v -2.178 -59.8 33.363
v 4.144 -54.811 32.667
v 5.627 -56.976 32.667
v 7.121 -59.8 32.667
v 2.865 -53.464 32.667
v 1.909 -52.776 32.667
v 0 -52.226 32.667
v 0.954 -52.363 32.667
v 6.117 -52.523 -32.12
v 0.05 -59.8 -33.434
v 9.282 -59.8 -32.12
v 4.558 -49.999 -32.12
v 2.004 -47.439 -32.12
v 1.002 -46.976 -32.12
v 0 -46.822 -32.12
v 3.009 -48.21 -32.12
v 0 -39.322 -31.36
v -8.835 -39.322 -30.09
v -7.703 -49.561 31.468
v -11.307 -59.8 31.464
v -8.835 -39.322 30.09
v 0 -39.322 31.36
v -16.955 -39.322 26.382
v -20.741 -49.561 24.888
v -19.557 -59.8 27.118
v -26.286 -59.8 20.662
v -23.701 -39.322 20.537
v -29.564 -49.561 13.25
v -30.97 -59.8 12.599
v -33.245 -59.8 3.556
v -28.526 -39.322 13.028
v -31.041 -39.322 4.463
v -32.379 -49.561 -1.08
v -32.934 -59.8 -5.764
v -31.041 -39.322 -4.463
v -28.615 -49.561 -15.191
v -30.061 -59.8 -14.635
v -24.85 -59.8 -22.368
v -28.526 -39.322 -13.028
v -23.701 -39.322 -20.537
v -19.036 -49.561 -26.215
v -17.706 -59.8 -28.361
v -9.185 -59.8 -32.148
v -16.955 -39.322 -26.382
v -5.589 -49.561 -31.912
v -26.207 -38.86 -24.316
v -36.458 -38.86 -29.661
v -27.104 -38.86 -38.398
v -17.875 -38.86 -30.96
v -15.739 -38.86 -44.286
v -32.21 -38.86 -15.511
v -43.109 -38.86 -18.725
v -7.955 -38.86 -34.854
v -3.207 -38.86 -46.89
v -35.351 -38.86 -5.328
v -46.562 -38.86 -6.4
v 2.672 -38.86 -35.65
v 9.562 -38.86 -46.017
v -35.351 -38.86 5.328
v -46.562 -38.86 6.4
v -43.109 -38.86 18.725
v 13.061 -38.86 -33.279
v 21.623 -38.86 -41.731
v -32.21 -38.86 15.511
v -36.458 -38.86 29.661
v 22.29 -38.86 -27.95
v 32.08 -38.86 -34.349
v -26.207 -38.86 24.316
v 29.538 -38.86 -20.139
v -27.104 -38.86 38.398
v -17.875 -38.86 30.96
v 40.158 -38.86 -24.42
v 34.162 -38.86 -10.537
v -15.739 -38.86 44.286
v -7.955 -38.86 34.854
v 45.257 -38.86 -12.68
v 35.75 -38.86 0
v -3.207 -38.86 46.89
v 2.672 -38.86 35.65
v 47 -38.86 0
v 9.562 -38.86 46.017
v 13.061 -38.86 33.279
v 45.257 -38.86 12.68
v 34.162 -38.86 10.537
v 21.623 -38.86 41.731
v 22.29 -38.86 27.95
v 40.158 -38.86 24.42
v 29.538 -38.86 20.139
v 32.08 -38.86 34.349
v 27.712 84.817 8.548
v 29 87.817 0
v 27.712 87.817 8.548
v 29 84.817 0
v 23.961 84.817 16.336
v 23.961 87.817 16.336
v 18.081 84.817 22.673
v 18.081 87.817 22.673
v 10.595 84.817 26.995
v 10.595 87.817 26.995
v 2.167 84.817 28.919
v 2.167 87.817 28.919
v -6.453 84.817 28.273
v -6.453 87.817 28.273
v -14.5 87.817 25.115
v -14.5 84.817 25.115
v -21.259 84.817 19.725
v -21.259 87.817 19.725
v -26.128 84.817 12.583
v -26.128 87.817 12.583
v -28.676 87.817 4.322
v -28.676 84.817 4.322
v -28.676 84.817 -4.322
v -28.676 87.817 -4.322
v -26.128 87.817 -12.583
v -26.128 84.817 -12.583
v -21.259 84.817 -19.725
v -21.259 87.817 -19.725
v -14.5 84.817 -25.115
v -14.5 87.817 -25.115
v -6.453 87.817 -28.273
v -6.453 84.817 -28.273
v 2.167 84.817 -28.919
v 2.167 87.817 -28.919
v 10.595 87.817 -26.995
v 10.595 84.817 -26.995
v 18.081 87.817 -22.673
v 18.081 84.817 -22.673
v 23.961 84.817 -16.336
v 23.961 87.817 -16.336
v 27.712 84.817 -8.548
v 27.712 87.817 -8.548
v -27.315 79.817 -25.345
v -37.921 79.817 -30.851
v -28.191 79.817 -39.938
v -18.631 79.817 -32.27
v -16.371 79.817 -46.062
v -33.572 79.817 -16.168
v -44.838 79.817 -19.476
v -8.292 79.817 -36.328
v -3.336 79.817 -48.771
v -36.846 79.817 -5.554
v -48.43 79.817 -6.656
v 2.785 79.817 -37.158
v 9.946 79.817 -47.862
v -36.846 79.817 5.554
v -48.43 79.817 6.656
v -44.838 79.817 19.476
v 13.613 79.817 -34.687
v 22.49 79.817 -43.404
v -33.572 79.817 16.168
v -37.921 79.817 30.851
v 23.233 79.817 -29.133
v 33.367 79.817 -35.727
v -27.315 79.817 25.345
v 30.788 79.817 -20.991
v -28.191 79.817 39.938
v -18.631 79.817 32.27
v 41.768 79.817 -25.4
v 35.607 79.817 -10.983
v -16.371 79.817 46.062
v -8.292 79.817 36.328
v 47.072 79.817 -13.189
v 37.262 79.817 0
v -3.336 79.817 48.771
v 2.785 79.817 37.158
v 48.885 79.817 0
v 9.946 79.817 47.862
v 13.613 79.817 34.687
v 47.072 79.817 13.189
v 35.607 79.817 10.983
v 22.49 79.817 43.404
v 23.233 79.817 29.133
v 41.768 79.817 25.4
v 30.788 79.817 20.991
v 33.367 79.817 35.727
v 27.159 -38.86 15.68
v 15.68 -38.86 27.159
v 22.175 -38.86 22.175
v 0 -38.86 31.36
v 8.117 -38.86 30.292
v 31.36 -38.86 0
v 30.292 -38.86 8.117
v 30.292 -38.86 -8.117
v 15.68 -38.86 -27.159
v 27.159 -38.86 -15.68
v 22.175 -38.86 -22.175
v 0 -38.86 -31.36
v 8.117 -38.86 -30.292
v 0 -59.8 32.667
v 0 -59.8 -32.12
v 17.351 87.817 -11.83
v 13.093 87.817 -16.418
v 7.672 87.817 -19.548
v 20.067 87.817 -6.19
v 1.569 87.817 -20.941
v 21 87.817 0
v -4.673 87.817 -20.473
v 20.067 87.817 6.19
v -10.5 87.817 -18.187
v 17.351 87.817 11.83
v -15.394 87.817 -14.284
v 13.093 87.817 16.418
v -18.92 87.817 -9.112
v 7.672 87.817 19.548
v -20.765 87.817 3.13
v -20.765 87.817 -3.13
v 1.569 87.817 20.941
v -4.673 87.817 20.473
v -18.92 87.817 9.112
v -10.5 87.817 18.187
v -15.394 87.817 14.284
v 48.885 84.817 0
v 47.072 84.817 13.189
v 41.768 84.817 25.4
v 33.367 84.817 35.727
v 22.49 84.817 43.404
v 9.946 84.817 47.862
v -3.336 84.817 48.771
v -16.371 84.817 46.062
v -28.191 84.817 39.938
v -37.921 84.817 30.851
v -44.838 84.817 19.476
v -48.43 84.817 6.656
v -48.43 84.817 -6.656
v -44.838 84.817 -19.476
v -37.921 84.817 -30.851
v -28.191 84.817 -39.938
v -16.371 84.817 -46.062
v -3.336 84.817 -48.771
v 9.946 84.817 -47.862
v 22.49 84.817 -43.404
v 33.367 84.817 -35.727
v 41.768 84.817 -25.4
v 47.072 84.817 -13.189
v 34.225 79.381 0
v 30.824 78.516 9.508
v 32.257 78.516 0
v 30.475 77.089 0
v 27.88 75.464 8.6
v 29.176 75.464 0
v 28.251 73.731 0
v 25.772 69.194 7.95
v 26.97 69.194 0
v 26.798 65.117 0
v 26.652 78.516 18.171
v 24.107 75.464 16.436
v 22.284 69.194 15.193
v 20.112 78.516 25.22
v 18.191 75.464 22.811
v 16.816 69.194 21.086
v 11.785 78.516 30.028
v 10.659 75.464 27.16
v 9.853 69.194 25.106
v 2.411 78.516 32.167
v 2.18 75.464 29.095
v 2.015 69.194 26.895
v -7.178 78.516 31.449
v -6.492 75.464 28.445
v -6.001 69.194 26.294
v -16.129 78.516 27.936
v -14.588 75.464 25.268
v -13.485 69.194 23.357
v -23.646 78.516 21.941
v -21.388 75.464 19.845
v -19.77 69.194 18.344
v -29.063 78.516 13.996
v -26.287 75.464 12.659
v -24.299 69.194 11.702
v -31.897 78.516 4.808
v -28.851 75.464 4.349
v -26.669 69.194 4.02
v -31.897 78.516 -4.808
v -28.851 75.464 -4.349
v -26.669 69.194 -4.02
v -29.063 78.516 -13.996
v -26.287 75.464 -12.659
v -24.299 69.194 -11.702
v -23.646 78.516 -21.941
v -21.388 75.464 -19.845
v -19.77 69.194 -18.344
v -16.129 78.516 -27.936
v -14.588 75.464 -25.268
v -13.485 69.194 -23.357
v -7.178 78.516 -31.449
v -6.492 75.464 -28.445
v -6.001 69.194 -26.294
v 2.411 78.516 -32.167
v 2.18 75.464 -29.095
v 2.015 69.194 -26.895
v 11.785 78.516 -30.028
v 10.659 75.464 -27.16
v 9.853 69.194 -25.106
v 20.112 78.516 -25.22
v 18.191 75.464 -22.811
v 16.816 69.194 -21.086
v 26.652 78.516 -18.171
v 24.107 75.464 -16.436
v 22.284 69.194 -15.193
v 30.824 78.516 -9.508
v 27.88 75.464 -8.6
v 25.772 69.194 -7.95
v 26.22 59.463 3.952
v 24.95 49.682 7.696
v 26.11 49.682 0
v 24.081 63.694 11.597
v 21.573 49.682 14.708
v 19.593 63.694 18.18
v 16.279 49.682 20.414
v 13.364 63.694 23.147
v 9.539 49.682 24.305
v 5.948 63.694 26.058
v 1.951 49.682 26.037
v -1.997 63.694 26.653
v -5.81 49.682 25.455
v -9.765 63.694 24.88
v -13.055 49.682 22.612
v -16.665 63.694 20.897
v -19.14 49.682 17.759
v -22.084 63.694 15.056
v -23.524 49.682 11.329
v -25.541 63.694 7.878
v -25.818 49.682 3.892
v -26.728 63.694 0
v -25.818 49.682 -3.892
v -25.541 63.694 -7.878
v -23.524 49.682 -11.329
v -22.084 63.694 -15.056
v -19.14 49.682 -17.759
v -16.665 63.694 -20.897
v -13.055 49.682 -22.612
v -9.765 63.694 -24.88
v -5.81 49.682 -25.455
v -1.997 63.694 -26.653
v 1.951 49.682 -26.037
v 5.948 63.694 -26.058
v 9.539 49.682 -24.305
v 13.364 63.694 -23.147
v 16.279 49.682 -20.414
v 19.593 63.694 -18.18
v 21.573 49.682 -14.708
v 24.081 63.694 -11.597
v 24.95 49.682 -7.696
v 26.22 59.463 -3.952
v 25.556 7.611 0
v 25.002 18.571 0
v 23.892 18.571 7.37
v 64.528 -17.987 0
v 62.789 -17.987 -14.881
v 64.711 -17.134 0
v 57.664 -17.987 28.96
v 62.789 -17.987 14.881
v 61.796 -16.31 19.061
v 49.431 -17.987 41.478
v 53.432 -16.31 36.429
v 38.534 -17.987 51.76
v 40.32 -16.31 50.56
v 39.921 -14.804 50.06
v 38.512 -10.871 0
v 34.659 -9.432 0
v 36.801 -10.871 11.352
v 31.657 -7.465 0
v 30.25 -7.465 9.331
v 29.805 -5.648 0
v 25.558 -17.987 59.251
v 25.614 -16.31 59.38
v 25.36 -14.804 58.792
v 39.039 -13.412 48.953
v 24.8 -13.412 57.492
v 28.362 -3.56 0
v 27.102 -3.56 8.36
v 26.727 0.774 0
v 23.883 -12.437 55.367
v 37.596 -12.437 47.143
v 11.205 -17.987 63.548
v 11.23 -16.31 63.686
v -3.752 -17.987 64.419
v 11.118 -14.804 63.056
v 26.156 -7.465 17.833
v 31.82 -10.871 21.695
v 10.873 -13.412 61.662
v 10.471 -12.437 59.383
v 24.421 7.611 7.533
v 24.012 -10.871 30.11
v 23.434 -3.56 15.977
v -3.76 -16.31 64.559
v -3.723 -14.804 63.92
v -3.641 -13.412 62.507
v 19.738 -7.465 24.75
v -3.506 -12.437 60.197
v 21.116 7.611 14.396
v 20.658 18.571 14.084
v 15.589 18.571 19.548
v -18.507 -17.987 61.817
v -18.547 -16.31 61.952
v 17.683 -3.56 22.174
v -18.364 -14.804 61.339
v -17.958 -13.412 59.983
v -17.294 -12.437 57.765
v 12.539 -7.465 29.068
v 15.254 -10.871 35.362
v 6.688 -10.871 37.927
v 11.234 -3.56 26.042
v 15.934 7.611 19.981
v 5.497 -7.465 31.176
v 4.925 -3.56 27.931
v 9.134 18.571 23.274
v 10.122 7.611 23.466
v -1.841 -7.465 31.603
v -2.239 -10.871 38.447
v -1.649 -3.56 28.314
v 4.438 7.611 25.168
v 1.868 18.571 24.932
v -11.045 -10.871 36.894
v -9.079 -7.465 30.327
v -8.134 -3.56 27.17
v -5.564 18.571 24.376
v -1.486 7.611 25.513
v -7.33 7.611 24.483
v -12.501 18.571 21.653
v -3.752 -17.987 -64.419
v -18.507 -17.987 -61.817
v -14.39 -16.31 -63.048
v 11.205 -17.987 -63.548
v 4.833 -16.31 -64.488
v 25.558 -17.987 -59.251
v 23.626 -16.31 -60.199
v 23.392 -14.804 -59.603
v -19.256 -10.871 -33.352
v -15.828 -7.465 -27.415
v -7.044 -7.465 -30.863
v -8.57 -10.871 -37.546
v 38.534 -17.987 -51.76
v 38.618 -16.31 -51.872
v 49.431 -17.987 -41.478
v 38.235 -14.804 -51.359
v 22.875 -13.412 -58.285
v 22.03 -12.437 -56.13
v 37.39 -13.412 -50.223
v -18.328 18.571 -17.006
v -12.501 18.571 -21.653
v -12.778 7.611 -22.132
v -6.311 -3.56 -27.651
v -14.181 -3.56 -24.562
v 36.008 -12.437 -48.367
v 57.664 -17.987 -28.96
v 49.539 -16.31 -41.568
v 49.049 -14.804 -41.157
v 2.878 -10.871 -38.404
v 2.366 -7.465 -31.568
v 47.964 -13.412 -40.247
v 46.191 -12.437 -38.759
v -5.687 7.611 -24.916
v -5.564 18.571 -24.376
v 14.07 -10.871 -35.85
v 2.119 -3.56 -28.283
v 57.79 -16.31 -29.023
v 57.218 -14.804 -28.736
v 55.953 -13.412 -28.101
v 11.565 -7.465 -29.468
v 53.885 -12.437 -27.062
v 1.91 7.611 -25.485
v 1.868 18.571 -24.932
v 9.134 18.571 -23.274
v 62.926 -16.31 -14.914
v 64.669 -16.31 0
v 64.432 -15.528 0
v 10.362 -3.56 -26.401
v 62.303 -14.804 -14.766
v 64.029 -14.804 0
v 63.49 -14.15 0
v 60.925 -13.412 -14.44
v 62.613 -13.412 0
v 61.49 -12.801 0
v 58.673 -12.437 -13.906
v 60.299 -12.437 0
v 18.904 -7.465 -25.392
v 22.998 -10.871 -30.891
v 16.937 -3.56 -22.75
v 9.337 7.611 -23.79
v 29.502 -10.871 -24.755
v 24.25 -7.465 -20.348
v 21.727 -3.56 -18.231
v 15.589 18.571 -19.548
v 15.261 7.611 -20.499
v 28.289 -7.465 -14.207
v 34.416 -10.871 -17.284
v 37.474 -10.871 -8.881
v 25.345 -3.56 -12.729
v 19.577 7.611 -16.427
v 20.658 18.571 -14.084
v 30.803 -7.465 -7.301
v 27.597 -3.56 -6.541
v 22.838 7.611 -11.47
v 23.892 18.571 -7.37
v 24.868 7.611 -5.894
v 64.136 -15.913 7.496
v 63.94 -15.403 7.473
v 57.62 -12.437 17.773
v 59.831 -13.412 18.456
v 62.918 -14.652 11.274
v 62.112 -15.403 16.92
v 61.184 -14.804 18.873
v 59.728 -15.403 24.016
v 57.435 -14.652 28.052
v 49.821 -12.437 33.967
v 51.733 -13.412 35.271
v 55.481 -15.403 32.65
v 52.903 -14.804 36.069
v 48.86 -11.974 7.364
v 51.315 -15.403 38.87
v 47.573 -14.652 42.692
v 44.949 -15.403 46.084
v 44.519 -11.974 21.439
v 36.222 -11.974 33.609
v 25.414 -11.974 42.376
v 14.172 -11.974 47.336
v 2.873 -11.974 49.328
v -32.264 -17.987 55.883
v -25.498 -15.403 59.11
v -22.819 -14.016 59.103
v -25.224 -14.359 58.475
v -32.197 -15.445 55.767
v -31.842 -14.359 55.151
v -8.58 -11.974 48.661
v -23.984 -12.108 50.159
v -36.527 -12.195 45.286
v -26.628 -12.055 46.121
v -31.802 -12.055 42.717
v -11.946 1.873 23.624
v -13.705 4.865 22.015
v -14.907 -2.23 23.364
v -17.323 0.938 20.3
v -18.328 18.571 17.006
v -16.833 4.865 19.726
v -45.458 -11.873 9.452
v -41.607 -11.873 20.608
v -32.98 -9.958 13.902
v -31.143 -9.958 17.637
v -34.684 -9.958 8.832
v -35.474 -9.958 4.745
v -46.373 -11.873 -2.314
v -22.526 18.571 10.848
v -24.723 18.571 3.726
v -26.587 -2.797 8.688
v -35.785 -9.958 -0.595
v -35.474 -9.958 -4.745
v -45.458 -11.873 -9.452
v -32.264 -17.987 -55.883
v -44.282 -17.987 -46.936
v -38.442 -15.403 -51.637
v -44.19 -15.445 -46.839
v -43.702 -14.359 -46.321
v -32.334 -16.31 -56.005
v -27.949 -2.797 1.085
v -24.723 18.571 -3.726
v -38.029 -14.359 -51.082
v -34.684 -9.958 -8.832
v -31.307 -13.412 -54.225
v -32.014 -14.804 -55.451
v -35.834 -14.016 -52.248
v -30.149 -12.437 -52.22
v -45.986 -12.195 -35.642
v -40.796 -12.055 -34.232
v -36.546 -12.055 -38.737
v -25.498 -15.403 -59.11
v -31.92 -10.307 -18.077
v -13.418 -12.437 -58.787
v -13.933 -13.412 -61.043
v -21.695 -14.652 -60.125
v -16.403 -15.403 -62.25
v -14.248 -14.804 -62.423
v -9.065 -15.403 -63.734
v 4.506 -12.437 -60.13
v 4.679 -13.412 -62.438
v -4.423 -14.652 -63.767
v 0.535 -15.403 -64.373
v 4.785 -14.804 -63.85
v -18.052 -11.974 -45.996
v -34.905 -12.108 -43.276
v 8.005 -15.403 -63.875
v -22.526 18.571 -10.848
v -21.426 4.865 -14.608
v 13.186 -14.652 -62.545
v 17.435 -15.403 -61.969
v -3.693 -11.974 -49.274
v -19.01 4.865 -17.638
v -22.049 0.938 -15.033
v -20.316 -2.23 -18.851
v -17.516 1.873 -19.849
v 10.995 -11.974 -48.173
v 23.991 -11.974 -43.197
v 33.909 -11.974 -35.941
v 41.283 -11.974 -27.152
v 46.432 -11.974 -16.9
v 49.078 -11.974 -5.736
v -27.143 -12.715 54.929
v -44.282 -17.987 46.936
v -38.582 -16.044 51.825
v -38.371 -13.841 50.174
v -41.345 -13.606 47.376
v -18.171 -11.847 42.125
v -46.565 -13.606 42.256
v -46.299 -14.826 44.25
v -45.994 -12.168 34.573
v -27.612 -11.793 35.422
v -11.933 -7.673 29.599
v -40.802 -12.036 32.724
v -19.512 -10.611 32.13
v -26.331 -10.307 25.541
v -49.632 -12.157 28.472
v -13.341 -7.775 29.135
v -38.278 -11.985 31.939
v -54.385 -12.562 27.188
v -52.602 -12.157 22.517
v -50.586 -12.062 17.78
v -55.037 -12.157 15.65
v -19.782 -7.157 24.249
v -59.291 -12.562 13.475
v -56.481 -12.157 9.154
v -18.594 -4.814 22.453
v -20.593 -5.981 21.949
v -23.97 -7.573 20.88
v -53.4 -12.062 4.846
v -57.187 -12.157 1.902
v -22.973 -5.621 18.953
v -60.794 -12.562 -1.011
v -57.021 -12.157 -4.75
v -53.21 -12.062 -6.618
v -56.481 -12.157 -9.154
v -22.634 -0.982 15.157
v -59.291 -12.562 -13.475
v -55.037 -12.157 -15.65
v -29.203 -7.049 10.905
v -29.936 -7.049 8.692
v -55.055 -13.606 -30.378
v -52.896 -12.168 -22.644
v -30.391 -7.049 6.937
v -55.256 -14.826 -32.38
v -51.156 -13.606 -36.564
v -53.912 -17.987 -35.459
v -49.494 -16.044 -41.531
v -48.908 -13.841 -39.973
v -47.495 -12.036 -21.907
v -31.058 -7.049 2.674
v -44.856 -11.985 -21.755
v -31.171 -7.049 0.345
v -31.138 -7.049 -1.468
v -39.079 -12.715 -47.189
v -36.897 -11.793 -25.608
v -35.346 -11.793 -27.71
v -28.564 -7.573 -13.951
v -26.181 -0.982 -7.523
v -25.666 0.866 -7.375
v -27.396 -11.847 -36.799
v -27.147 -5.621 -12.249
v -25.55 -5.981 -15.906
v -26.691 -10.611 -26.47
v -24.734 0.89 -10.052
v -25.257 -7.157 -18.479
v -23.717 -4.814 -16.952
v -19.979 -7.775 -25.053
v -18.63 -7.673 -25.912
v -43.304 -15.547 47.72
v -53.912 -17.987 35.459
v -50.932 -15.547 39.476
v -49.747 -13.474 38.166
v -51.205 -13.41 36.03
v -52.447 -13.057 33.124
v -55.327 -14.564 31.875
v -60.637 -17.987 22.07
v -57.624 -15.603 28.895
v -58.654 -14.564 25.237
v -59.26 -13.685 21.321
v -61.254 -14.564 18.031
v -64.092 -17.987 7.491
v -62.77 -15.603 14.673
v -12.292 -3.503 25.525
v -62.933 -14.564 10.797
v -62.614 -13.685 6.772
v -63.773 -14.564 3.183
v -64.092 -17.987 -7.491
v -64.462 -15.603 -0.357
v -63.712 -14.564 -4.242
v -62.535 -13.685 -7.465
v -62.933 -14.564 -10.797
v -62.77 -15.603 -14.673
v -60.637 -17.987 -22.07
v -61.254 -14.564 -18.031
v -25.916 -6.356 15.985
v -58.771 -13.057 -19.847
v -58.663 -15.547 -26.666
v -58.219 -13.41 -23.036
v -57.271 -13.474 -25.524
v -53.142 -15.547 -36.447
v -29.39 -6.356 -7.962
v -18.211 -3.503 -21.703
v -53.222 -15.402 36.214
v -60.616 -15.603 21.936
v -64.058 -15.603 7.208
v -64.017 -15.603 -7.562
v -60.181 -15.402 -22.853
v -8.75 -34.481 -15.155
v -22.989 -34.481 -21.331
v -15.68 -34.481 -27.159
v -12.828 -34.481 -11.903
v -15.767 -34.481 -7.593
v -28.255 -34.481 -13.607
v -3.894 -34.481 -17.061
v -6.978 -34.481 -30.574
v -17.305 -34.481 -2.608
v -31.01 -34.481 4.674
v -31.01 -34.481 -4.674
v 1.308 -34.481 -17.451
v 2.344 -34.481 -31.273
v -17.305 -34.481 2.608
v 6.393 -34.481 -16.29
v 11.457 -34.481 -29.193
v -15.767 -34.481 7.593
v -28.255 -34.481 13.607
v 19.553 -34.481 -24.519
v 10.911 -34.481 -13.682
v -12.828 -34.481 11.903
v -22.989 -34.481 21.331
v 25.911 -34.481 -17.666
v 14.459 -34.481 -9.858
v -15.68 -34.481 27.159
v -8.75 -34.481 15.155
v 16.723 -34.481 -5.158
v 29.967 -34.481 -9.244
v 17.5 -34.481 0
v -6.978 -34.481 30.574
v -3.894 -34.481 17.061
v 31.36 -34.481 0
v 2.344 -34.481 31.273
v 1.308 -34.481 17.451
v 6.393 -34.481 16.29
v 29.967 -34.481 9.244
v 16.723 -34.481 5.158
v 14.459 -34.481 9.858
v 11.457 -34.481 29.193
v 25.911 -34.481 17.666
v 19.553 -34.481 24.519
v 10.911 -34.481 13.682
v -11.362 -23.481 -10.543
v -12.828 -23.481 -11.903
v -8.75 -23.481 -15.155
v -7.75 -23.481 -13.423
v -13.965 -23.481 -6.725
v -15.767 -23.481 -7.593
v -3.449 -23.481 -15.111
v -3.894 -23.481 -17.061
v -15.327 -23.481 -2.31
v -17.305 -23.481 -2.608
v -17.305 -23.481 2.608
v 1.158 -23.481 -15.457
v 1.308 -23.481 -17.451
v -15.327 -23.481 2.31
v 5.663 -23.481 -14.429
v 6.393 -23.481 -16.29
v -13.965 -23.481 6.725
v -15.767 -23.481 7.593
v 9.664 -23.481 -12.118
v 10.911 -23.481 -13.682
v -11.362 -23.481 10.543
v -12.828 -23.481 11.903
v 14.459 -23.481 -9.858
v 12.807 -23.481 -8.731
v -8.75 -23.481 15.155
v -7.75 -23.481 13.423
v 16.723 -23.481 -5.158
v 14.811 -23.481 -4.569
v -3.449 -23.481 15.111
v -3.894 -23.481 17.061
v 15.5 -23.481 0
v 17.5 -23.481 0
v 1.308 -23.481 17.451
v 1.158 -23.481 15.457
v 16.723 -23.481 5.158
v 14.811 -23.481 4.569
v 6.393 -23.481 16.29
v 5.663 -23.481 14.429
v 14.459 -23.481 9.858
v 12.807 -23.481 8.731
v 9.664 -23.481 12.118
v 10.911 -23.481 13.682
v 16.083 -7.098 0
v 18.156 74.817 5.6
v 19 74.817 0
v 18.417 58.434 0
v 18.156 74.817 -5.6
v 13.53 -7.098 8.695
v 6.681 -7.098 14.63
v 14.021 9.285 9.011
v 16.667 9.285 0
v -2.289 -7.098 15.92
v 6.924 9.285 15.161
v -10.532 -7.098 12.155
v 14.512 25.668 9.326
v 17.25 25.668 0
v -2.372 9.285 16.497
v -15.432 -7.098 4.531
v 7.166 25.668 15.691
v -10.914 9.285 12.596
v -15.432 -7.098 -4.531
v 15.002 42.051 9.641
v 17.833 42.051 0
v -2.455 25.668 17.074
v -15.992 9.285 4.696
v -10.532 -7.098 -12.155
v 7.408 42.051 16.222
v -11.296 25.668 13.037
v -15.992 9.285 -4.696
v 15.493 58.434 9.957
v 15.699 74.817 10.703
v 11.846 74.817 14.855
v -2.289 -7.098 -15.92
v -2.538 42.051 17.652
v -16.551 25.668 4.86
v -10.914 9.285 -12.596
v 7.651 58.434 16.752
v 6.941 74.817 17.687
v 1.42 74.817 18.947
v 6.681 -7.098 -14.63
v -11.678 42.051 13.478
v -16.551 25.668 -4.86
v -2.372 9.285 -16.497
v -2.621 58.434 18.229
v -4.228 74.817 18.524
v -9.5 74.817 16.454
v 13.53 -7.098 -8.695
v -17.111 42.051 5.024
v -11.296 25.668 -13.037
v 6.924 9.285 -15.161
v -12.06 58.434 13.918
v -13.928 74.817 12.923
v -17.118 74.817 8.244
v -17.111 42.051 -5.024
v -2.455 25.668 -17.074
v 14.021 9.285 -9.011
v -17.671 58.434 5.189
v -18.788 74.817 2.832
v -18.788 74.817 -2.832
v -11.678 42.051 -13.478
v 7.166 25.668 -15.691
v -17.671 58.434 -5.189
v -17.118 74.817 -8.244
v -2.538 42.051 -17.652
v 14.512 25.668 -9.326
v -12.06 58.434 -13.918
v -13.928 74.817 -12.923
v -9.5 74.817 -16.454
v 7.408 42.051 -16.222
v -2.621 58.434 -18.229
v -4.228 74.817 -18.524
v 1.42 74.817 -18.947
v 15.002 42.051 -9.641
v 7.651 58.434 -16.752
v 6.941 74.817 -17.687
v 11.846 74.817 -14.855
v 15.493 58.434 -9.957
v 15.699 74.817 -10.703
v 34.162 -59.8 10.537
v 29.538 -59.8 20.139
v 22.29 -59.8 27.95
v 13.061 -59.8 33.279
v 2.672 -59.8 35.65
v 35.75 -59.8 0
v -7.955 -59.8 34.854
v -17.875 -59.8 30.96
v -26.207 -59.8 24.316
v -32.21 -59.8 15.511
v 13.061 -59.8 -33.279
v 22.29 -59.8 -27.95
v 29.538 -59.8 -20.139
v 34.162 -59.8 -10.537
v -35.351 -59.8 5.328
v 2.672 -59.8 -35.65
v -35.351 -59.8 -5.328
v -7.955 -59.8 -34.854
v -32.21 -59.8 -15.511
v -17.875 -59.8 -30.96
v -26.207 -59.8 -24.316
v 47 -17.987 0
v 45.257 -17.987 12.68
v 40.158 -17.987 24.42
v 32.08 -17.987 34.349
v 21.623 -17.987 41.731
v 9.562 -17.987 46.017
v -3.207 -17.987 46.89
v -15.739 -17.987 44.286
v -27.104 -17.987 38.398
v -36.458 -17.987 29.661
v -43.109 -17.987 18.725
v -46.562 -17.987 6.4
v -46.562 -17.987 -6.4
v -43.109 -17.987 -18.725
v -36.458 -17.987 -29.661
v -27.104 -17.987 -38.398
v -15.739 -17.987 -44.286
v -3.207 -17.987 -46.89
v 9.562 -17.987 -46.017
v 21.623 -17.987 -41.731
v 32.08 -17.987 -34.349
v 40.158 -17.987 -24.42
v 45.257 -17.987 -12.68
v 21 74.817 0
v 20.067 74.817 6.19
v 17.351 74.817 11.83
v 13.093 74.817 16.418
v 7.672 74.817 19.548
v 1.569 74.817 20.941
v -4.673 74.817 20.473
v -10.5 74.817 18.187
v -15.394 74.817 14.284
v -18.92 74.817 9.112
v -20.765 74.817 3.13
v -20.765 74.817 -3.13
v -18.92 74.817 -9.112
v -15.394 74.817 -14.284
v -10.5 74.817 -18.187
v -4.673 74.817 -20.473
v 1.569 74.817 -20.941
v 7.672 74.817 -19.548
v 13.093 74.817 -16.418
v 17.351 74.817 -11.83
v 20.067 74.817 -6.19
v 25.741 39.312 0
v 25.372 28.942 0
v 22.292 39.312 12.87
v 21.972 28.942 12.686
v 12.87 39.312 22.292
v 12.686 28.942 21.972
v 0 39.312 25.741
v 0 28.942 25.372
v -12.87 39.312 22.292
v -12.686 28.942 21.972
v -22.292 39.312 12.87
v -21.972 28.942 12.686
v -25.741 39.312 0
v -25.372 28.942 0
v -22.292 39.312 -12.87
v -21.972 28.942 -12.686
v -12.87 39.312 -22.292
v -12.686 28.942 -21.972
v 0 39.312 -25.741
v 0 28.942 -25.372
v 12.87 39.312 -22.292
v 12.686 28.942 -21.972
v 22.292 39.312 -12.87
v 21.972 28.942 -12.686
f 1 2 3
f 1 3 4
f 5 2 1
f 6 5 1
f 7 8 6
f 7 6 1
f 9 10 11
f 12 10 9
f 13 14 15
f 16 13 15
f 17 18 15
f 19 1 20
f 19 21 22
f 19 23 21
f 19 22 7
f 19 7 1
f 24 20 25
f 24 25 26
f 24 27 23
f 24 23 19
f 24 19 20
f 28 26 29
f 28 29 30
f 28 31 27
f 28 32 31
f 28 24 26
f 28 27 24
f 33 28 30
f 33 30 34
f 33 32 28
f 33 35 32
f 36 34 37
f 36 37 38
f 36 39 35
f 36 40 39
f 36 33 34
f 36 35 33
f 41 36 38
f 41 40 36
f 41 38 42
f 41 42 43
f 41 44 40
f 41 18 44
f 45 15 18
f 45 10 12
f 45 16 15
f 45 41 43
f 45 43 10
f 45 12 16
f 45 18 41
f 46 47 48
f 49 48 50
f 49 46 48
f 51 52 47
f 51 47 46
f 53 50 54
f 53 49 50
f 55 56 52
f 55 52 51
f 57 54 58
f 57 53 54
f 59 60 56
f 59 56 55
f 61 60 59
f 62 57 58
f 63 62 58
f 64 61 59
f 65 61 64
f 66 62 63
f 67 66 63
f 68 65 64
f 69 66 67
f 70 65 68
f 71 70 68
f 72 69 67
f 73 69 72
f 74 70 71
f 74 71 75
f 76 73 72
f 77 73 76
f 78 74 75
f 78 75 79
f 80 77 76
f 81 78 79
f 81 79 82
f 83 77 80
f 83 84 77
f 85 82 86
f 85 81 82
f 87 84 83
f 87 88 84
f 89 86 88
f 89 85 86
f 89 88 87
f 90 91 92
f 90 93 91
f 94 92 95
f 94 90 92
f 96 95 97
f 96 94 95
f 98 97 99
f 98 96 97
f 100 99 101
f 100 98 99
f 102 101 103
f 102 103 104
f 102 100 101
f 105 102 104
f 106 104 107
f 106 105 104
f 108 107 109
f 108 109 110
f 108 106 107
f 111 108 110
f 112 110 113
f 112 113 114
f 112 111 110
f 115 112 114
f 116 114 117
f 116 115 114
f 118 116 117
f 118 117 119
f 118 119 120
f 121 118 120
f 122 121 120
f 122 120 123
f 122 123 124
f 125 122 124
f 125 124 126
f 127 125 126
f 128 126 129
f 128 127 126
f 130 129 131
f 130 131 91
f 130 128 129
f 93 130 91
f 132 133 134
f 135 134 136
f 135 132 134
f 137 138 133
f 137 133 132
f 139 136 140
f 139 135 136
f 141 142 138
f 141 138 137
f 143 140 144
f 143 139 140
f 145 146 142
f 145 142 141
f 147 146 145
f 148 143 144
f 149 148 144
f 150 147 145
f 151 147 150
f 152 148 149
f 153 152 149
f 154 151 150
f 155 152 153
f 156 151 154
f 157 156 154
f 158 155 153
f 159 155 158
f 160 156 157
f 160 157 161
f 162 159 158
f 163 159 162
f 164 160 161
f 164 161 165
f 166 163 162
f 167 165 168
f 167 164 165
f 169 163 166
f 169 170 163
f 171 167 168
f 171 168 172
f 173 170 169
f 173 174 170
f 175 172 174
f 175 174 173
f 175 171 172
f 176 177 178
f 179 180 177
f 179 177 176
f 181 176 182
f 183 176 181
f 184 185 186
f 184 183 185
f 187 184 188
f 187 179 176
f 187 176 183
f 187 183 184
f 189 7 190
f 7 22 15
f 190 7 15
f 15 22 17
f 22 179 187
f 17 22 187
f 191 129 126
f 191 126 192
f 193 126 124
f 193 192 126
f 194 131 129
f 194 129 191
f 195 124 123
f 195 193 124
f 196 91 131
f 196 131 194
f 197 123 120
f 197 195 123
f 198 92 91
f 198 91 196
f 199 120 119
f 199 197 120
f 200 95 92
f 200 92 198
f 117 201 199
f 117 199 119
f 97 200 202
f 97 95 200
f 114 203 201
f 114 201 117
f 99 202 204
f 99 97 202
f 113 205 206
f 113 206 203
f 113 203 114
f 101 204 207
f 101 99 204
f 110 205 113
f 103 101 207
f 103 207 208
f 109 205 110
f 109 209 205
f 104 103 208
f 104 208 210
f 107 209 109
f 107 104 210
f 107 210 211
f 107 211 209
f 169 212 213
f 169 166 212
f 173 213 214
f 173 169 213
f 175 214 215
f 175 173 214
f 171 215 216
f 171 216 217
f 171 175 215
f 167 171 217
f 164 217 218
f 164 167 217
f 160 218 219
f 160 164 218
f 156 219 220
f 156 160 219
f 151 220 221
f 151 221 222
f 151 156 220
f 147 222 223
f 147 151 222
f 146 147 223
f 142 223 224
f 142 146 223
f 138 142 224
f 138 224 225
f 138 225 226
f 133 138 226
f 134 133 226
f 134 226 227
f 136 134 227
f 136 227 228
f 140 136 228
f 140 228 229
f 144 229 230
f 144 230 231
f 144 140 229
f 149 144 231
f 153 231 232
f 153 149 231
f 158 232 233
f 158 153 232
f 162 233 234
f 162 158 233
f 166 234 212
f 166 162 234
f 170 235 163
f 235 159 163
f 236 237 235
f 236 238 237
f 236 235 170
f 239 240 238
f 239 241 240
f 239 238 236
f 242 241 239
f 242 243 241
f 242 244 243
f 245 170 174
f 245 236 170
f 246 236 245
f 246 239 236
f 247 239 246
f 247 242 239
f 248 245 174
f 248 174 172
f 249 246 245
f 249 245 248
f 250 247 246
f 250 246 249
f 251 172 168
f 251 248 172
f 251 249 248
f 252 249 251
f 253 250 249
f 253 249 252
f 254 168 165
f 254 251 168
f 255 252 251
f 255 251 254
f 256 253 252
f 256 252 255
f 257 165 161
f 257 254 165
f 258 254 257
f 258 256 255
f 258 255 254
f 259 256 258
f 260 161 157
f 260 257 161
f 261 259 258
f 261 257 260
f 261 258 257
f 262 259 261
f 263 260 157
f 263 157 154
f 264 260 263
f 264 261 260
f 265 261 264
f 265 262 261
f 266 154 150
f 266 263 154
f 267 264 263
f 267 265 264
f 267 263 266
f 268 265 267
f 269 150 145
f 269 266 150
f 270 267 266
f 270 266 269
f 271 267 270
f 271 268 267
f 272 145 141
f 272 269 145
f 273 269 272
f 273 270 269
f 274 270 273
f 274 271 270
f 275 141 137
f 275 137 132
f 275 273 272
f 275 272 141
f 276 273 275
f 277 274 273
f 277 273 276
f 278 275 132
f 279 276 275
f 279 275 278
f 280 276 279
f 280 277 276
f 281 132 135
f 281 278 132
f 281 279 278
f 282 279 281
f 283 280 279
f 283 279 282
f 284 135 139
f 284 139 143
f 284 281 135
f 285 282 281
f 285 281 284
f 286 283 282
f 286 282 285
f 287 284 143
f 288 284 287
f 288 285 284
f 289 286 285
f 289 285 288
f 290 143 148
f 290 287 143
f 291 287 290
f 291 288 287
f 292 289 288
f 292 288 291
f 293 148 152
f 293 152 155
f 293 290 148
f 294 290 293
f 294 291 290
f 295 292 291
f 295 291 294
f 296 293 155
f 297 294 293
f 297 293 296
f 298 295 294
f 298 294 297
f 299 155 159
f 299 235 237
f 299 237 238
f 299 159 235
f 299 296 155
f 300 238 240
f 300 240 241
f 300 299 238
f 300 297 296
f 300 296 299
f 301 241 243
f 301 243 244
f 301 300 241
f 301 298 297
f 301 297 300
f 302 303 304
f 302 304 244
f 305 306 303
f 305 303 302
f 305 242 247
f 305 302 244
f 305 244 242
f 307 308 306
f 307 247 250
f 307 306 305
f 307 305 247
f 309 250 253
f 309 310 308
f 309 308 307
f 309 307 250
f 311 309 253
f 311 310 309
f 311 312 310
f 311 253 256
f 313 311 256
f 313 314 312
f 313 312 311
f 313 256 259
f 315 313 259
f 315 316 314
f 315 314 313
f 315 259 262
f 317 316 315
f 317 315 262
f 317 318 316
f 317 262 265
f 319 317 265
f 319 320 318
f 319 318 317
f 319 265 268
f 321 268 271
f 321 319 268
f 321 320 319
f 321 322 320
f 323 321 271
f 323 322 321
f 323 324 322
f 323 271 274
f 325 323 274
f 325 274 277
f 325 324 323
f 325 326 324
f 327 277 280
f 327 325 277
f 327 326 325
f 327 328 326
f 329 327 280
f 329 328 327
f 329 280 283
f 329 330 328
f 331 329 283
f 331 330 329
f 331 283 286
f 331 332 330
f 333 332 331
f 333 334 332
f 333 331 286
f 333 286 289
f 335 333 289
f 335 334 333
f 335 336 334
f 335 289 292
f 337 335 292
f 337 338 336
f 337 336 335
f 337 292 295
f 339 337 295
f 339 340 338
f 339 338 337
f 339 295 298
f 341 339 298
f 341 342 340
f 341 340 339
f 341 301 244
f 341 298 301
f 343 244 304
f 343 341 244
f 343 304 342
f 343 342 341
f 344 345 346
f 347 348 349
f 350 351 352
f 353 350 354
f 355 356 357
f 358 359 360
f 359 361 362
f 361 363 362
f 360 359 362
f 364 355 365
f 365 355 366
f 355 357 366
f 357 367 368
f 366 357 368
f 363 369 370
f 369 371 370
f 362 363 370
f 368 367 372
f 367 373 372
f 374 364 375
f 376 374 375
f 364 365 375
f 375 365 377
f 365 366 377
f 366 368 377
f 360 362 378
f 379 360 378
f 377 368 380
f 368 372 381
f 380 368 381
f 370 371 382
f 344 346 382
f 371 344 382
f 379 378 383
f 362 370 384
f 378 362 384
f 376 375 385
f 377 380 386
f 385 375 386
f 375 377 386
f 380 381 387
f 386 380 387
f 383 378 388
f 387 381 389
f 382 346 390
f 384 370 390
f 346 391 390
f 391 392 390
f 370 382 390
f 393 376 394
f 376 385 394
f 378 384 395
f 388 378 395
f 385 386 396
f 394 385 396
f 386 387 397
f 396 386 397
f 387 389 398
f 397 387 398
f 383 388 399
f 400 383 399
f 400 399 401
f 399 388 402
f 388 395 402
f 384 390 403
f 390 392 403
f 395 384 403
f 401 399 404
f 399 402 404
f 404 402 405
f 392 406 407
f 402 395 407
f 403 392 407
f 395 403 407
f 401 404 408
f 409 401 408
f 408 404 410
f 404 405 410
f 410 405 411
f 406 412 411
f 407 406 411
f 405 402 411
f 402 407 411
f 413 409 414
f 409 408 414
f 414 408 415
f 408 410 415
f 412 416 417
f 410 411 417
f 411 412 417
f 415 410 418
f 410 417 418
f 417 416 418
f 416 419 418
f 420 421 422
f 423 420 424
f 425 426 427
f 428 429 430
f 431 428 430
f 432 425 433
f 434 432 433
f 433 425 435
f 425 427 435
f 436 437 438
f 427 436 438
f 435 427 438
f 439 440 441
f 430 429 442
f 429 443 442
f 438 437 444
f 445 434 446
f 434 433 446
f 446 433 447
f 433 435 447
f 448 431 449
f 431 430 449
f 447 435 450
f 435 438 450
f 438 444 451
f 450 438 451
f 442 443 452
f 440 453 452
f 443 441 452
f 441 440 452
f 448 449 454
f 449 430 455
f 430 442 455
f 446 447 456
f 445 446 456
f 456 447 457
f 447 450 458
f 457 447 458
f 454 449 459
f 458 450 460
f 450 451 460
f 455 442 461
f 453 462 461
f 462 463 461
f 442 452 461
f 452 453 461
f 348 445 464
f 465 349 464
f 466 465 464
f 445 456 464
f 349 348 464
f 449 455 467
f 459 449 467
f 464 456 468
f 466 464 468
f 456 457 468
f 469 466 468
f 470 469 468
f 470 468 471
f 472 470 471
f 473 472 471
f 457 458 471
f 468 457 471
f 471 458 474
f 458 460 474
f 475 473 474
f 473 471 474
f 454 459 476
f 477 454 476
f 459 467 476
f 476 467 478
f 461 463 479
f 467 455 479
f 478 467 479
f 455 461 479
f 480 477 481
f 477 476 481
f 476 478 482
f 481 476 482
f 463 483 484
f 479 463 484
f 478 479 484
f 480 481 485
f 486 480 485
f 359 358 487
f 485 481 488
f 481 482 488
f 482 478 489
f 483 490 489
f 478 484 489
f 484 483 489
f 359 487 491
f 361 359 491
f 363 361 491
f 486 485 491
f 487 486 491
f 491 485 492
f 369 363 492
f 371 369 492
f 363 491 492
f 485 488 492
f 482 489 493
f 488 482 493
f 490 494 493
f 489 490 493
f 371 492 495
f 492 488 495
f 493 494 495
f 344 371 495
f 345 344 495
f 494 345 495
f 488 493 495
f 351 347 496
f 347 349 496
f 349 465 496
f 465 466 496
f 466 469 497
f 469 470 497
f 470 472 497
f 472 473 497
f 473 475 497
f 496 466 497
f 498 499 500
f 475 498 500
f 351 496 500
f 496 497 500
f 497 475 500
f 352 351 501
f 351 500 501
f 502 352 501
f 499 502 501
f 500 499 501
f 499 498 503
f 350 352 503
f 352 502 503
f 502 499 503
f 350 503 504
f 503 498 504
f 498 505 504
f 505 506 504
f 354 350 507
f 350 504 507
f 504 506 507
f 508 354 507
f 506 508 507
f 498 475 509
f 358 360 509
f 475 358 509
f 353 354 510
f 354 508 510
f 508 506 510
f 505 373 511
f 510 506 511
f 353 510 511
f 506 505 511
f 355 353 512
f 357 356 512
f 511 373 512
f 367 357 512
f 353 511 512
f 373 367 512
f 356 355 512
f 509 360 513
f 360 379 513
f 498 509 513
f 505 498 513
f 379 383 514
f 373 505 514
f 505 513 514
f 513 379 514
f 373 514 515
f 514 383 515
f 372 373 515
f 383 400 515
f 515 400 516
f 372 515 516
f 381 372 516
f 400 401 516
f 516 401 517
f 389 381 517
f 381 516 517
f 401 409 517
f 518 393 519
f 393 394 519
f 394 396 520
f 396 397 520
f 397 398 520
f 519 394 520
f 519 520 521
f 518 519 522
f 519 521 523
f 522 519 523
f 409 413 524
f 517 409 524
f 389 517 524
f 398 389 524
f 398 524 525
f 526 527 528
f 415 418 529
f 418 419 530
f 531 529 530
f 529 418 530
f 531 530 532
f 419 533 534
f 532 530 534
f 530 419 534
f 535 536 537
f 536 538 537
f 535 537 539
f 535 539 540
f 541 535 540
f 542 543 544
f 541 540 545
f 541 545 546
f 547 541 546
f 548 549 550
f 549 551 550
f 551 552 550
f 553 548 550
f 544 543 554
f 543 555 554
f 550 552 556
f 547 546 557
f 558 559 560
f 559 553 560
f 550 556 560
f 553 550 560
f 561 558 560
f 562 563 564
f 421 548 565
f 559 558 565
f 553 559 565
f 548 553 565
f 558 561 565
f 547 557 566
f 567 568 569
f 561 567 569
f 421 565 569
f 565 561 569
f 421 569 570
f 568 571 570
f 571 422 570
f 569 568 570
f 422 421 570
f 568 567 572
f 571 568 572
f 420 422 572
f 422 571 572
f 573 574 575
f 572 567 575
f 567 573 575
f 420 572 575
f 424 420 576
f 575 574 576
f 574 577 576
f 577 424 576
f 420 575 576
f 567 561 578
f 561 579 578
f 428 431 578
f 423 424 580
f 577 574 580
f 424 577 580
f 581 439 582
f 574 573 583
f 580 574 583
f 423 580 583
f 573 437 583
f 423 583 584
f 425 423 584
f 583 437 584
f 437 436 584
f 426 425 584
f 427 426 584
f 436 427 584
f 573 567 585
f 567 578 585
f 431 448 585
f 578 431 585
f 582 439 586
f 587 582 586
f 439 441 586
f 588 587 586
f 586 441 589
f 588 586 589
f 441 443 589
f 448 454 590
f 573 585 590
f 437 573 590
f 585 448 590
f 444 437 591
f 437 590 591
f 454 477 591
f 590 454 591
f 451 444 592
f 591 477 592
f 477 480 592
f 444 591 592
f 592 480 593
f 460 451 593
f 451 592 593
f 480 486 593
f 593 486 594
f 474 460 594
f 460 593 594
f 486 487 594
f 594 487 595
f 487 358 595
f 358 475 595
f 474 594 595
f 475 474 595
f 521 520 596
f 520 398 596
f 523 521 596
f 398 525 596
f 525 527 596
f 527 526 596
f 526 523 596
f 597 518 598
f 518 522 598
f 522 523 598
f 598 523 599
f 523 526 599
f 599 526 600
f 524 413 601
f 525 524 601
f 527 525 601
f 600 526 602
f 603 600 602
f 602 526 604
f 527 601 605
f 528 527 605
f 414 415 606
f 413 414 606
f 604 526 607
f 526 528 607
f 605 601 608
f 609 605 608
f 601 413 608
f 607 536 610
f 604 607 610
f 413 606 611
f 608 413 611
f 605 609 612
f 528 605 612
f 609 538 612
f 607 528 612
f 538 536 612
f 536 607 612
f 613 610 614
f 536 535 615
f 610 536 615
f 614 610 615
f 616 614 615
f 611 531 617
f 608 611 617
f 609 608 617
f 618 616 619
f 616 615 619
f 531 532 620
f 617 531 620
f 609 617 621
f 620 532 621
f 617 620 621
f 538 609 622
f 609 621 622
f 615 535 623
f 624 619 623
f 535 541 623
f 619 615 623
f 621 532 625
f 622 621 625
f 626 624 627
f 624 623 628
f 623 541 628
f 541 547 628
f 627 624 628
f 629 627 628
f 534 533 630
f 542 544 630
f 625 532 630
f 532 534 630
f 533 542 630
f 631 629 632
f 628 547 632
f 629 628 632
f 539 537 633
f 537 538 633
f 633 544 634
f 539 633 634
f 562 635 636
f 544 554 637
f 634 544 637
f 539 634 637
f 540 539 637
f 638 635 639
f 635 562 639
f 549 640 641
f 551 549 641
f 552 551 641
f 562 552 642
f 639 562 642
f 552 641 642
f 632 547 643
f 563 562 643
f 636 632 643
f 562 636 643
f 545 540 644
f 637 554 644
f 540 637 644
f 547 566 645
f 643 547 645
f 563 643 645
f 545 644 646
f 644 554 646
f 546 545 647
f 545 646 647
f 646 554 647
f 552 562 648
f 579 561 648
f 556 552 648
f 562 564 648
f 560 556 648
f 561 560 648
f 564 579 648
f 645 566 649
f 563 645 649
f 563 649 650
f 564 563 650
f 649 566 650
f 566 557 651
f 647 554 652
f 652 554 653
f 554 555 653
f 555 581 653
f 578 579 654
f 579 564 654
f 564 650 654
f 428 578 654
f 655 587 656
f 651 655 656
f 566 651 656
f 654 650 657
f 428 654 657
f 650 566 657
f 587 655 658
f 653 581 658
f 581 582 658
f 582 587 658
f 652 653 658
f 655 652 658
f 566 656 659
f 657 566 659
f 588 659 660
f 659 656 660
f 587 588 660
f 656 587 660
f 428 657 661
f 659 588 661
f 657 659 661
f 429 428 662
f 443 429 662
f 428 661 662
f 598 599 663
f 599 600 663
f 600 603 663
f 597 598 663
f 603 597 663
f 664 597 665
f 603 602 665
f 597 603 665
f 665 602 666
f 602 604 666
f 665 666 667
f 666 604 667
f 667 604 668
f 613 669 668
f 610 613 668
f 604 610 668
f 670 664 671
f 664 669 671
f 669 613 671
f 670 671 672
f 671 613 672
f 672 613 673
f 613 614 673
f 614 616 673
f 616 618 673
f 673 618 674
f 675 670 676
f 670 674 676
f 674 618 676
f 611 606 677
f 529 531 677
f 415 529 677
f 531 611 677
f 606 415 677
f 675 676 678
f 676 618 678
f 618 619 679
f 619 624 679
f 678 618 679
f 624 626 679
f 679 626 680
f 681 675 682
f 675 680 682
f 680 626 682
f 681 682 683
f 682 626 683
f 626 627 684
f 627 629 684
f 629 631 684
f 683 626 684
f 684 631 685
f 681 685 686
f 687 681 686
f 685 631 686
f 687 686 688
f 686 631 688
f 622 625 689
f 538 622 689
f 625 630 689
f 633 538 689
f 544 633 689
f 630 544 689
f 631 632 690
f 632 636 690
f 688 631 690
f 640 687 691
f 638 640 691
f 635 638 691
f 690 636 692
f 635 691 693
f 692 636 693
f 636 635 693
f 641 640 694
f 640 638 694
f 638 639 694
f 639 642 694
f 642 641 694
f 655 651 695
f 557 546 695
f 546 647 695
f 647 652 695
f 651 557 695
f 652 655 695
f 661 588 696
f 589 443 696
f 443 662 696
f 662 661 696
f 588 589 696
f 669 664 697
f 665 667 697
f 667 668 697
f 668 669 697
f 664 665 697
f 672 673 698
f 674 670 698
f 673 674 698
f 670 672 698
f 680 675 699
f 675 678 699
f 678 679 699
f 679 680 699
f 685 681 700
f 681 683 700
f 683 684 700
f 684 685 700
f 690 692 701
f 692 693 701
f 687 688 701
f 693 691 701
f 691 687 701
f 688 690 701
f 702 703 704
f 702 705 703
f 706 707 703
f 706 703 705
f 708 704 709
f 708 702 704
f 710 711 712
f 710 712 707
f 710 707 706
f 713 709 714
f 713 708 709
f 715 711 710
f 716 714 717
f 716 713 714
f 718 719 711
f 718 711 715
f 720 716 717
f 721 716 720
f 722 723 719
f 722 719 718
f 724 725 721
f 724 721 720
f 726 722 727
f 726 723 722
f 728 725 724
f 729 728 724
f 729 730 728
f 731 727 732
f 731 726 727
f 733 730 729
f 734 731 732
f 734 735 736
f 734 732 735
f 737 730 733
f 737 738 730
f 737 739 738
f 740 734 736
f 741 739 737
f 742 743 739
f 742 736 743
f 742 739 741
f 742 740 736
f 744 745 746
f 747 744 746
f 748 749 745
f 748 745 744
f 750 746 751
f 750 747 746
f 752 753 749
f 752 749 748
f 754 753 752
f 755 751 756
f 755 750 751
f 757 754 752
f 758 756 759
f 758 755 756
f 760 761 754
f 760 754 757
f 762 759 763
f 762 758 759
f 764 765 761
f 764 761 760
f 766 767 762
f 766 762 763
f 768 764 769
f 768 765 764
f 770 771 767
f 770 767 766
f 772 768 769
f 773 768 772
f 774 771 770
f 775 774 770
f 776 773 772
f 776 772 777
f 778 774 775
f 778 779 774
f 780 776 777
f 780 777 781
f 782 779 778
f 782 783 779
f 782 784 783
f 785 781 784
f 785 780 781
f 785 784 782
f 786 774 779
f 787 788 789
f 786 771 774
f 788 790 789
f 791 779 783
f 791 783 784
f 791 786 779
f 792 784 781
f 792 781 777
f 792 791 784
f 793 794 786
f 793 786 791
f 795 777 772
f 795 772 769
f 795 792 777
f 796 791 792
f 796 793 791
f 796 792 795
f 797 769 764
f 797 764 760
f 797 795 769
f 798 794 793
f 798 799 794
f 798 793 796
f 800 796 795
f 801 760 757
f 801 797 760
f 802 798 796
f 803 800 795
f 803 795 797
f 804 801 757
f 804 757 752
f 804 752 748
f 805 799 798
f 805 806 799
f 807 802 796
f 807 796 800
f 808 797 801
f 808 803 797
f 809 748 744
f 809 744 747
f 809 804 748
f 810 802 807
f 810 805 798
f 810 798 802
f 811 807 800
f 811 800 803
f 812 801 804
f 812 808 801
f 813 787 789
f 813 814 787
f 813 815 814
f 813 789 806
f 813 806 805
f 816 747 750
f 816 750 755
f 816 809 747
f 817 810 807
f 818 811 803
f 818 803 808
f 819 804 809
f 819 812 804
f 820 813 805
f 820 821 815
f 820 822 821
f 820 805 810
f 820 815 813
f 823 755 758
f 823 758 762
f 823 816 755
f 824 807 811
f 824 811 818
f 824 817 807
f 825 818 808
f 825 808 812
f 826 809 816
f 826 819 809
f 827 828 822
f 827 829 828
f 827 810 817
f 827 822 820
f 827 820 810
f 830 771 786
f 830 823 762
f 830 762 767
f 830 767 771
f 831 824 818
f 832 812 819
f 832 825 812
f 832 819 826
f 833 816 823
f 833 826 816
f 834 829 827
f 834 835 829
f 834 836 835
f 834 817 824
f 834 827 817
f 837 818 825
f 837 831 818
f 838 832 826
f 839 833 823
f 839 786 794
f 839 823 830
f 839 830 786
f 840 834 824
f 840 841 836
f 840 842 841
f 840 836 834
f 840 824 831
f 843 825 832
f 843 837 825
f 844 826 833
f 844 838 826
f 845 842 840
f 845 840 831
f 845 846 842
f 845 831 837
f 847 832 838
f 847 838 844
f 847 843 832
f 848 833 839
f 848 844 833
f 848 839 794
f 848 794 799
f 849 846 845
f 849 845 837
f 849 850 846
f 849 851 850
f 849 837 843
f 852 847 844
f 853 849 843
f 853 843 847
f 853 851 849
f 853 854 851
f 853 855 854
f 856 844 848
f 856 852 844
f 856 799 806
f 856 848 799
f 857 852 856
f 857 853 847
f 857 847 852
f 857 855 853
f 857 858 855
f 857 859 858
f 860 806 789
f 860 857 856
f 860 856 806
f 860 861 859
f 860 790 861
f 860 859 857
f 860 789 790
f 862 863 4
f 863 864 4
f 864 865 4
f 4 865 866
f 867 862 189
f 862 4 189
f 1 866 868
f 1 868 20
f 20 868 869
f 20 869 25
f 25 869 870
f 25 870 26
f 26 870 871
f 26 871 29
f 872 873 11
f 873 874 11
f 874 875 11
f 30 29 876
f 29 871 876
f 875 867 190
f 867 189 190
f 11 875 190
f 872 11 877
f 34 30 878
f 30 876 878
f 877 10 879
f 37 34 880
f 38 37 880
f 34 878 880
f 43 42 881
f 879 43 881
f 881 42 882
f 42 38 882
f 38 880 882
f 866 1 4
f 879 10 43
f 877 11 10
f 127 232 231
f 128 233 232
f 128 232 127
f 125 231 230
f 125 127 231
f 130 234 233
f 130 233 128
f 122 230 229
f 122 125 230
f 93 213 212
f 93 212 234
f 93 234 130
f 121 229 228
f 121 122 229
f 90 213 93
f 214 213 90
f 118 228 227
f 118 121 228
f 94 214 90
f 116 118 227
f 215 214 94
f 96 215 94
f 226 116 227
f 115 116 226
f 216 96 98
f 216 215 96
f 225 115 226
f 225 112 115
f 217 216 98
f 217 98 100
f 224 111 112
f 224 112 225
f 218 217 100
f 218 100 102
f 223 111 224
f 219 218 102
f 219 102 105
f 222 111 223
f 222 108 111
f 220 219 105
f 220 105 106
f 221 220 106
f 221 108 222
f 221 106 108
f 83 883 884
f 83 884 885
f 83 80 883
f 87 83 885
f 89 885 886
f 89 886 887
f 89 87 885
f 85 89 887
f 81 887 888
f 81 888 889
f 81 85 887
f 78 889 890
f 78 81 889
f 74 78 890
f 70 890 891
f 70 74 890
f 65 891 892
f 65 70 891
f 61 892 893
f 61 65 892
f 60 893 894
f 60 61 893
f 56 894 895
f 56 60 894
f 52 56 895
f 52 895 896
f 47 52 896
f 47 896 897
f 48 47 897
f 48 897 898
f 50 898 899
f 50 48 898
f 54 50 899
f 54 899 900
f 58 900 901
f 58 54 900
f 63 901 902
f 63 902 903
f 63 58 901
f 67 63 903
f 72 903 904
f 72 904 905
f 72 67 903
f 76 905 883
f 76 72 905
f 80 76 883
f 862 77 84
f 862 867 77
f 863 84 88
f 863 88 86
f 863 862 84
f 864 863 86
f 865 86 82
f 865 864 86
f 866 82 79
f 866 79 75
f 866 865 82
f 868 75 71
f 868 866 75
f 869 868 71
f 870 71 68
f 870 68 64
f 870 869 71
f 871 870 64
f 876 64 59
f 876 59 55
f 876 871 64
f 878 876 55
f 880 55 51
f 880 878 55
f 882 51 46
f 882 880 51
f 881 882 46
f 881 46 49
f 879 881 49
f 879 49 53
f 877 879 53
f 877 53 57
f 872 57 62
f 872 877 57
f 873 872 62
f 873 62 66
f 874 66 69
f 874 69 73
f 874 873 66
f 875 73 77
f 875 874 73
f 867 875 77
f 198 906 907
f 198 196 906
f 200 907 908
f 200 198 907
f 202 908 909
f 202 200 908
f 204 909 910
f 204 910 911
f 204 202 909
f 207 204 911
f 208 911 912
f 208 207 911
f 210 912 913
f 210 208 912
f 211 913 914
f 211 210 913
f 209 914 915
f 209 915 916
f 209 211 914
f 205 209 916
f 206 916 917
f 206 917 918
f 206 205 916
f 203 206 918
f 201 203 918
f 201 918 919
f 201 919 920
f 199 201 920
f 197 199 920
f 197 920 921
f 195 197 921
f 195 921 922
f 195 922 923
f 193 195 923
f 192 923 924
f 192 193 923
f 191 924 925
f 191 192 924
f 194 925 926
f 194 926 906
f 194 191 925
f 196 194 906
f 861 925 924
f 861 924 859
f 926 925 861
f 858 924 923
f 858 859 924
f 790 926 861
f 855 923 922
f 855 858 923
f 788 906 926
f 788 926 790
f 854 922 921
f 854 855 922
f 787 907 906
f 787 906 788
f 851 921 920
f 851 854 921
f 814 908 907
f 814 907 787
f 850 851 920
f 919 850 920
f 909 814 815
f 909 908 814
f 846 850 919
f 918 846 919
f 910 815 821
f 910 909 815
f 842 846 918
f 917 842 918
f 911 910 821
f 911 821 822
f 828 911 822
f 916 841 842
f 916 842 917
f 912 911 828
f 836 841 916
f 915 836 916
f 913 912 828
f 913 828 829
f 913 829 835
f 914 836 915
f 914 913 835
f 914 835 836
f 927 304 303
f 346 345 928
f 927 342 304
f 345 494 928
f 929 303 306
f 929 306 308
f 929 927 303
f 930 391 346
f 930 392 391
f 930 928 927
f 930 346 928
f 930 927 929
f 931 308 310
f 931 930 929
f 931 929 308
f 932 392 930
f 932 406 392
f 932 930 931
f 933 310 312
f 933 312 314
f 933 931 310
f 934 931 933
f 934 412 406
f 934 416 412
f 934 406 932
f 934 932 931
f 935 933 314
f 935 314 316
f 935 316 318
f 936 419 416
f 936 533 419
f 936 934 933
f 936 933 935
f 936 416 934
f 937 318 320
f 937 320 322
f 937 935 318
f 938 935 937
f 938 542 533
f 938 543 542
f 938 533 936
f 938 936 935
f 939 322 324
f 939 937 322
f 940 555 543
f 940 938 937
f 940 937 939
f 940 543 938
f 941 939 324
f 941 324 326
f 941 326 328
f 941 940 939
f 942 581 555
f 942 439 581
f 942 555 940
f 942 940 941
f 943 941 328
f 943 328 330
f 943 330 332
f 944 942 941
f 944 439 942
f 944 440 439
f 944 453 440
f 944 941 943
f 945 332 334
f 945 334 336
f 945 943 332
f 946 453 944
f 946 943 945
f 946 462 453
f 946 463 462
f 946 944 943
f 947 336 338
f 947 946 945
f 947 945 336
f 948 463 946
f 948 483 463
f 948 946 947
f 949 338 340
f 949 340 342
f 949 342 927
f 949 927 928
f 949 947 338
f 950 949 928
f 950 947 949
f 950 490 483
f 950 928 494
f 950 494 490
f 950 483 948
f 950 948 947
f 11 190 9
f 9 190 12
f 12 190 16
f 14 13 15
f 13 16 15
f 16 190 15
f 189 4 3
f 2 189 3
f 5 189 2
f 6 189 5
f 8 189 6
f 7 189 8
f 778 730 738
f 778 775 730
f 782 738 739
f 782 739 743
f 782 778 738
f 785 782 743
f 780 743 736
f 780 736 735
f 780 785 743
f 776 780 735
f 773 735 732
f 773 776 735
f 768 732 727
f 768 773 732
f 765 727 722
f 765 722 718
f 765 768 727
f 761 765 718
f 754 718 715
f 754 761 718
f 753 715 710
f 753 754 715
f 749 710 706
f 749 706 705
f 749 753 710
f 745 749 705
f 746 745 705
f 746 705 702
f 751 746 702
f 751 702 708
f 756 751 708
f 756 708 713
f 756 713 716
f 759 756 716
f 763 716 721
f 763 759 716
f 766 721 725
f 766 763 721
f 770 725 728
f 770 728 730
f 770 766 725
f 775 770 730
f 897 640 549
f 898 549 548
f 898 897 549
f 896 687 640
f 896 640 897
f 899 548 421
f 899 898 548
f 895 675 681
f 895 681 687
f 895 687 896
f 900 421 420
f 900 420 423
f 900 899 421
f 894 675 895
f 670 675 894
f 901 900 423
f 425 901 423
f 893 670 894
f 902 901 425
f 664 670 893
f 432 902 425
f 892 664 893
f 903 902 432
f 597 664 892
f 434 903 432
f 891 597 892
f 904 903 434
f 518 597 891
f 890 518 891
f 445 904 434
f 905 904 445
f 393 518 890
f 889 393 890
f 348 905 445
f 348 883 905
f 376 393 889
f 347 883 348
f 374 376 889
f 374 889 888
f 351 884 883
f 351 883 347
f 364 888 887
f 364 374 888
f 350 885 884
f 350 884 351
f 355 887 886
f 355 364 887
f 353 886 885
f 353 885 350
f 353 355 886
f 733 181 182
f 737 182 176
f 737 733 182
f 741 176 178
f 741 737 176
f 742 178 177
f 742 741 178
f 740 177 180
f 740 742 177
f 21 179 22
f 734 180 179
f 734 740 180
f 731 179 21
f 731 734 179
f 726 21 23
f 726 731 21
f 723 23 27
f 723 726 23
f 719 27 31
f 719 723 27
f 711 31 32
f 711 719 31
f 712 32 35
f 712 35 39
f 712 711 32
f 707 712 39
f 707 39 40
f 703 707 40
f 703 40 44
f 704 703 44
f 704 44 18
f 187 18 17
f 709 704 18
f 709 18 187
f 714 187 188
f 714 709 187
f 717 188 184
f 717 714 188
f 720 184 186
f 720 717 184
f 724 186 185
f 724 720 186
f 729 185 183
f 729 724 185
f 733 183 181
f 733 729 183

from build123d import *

# Parameters (mm, degrees)
BOSS_EXTRUDE1_REACH = 66.721
SKETCH3_W           = 64.787323871
SKETCH3_H           = 20.939874787


with BuildPart() as part:
    # Sketch1 → Revolve1 (revolve)
    with BuildSketch(Plane.XY):
        with BuildLine():
            Line((19, 74.817317551), (21, 74.817317551))
            Line((21, 74.817317551), (21, 87.817317551))
            Line((21, 87.817317551), (29, 87.817317551))
            Line((29, 87.817317551), (29, 84.817317551))
            Line((29, 84.817317551), (48.884927091, 84.817317551))
            Line((48.884927091, 84.817317551), (48.884927091, 79.817317551))
            Line((48.884927091, 79.817317551), (37.26232647, 79.817317551))
            add(Edge.make_bspline(
                [(37.26232647, 79.817317551), (35.317542772, 79.817317551), (31.576426132, 78.956130843), (28.504834315, 74.722950853), (26.811531328, 69.225059311), (27.023440035, 67.0117878), (26.529376961, 61.457439784), (26.110101007, 49.682029535)],
                knots=[0, 0, 0, 0, 0.027814375, 0.048077406, 0.056130992, 0.108350232, 0.258095951, 0.258095951, 0.258095951, 0.258095951], degree=3))
            Line((26.110101007, 49.682029535), (25.002372474, 18.571354555))
            add(Edge.make_bspline(
                [(64.528129231, -17.987011239), (65.304995671, -15.790991926), (62.495595706, -12.403296178), (55.378812109, -12.037399906), (46.505259928, -12.035031844), (35.990414113, -11.165636172), (27.978614985, -4.711317004), (25.439837988, 5.526983198), (24.863232294, 14.663587636), (25.002372474, 18.571354555)],
                knots=[0, 0, 0, 0, 0.097399991, 0.161218221, 0.32460028, 0.514717464, 0.634012286, 0.770814213, 1, 1, 1, 1], degree=3))
            Line((64.528129231, -17.987011239), (47, -17.987011239))
            Line((47, -17.987011239), (47, -38.859991473))
            Line((47, -38.859991473), (35.75, -38.859991473))
            Line((35.75, -38.859991473), (35.75, -59.79986626))
            Line((35.75, -59.79986626), (33.434340492, -59.79986626))
            Line((33.434340492, -59.79986626), (31.360417848, -39.321612307))
            Line((31.360417848, -39.321612307), (31.360417848, -34.480558786))
            Line((31.360417848, -34.480558786), (17.5, -34.480558786))
            Line((17.5, -34.480558786), (17.5, -23.480558786))
            Line((17.5, -23.480558786), (15.5, -23.480558786))
            Line((15.5, -23.480558786), (19, 74.817317551))
        make_face()
    revolve(axis=Axis((0, 926.027727684, 0), (0, -1, 0)))

    # Sketch3 → Boss-Extrude1 (add, up to next)
    with BuildSketch(Plane(origin=(0, 0, 0), x_dir=(0, 0, -1), z_dir=(1, 0, 0)), mode=Mode.PRIVATE) as boss_extrude1_sk1:
        with Locations((-0.273634545, -49.329928866)):
            Rectangle(SKETCH3_W, SKETCH3_H)
    boss_extrude1_tool1 = extrude(boss_extrude1_sk1.sketch, amount=BOSS_EXTRUDE1_REACH, mode=Mode.PRIVATE) - part.part
    add(boss_extrude1_tool1.solids().sort_by_distance((0, -49.329929, 0.273635))[0])


solid = part.part
